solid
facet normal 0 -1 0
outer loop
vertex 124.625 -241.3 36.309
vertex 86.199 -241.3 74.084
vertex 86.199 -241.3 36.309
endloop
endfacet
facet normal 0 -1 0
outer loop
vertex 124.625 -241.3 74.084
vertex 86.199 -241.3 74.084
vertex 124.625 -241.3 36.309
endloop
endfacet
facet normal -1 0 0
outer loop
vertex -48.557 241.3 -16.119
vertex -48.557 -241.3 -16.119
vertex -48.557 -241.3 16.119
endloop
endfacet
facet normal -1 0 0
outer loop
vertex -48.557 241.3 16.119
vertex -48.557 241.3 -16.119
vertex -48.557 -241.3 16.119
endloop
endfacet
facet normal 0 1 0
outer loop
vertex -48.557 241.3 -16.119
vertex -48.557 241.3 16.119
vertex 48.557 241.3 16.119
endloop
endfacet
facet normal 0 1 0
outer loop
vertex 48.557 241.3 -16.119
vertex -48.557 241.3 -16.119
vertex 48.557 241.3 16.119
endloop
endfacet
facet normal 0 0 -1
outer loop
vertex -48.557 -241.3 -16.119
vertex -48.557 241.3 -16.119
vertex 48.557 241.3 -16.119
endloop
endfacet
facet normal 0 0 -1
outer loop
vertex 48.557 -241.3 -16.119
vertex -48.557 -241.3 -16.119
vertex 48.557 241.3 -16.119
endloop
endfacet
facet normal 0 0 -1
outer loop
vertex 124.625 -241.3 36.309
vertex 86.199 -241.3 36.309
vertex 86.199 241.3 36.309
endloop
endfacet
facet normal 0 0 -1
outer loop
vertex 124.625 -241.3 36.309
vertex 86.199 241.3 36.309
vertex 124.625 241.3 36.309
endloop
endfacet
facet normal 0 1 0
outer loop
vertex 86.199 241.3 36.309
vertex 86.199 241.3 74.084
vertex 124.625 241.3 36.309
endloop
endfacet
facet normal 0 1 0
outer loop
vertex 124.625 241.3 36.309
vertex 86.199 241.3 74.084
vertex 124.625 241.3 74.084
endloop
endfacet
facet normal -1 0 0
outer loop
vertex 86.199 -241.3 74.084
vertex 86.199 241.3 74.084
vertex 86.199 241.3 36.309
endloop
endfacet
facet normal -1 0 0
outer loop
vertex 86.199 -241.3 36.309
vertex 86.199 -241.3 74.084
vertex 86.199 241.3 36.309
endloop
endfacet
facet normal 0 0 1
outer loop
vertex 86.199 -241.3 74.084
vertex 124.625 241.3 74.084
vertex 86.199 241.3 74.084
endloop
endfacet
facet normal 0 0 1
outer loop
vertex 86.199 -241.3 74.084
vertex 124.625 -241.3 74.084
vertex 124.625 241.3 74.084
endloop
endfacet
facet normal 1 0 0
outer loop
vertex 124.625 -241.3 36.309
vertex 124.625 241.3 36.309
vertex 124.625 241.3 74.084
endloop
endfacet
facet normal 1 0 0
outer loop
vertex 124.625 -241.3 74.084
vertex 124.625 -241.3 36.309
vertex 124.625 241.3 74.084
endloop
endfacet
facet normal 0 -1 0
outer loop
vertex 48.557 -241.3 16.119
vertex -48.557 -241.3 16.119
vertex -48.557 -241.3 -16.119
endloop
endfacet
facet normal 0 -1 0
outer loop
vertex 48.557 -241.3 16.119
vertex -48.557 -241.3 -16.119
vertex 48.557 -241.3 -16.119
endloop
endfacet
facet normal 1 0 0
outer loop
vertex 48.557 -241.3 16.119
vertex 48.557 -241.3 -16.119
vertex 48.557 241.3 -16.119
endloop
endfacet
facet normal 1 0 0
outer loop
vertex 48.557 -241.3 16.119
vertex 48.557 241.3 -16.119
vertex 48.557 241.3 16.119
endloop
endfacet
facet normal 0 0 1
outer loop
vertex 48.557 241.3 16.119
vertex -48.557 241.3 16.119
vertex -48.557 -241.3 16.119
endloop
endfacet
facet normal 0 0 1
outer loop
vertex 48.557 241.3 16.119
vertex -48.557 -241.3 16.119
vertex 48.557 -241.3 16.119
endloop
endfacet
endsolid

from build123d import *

# Parameters (mm, degrees)
F0_W     = 97.1144884825
F0_H     = 32.2388261557
F1_DEPTH = 241.3


# Not quite as in the source:
# - the program builds the solid bodies; features that only make, move or delete a surface that nothing else refers to are left out


with BuildPart() as f1:
    # F0 (on Front) → F1 (new body, symmetric)
    with BuildSketch(Plane.XZ):
        Rectangle(F0_W, F0_H)
    extrude(amount=F1_DEPTH, both=True)


with BuildPart() as f1b:
    # F0 (on Front) → F1, piece 2 (new body, symmetric)
    with BuildSketch(Plane.XZ):
        Polygon((86.1985152434, 74.0841701627), (86.1985152434, 55.1967807114), (86.1985152434, 36.3093912601), (124.6246164511, 36.3093912601), (124.6246164511, 74.0841701627), align=None)
    extrude(amount=F1_DEPTH, both=True)


solid = Compound([f1.part, f1b.part])
